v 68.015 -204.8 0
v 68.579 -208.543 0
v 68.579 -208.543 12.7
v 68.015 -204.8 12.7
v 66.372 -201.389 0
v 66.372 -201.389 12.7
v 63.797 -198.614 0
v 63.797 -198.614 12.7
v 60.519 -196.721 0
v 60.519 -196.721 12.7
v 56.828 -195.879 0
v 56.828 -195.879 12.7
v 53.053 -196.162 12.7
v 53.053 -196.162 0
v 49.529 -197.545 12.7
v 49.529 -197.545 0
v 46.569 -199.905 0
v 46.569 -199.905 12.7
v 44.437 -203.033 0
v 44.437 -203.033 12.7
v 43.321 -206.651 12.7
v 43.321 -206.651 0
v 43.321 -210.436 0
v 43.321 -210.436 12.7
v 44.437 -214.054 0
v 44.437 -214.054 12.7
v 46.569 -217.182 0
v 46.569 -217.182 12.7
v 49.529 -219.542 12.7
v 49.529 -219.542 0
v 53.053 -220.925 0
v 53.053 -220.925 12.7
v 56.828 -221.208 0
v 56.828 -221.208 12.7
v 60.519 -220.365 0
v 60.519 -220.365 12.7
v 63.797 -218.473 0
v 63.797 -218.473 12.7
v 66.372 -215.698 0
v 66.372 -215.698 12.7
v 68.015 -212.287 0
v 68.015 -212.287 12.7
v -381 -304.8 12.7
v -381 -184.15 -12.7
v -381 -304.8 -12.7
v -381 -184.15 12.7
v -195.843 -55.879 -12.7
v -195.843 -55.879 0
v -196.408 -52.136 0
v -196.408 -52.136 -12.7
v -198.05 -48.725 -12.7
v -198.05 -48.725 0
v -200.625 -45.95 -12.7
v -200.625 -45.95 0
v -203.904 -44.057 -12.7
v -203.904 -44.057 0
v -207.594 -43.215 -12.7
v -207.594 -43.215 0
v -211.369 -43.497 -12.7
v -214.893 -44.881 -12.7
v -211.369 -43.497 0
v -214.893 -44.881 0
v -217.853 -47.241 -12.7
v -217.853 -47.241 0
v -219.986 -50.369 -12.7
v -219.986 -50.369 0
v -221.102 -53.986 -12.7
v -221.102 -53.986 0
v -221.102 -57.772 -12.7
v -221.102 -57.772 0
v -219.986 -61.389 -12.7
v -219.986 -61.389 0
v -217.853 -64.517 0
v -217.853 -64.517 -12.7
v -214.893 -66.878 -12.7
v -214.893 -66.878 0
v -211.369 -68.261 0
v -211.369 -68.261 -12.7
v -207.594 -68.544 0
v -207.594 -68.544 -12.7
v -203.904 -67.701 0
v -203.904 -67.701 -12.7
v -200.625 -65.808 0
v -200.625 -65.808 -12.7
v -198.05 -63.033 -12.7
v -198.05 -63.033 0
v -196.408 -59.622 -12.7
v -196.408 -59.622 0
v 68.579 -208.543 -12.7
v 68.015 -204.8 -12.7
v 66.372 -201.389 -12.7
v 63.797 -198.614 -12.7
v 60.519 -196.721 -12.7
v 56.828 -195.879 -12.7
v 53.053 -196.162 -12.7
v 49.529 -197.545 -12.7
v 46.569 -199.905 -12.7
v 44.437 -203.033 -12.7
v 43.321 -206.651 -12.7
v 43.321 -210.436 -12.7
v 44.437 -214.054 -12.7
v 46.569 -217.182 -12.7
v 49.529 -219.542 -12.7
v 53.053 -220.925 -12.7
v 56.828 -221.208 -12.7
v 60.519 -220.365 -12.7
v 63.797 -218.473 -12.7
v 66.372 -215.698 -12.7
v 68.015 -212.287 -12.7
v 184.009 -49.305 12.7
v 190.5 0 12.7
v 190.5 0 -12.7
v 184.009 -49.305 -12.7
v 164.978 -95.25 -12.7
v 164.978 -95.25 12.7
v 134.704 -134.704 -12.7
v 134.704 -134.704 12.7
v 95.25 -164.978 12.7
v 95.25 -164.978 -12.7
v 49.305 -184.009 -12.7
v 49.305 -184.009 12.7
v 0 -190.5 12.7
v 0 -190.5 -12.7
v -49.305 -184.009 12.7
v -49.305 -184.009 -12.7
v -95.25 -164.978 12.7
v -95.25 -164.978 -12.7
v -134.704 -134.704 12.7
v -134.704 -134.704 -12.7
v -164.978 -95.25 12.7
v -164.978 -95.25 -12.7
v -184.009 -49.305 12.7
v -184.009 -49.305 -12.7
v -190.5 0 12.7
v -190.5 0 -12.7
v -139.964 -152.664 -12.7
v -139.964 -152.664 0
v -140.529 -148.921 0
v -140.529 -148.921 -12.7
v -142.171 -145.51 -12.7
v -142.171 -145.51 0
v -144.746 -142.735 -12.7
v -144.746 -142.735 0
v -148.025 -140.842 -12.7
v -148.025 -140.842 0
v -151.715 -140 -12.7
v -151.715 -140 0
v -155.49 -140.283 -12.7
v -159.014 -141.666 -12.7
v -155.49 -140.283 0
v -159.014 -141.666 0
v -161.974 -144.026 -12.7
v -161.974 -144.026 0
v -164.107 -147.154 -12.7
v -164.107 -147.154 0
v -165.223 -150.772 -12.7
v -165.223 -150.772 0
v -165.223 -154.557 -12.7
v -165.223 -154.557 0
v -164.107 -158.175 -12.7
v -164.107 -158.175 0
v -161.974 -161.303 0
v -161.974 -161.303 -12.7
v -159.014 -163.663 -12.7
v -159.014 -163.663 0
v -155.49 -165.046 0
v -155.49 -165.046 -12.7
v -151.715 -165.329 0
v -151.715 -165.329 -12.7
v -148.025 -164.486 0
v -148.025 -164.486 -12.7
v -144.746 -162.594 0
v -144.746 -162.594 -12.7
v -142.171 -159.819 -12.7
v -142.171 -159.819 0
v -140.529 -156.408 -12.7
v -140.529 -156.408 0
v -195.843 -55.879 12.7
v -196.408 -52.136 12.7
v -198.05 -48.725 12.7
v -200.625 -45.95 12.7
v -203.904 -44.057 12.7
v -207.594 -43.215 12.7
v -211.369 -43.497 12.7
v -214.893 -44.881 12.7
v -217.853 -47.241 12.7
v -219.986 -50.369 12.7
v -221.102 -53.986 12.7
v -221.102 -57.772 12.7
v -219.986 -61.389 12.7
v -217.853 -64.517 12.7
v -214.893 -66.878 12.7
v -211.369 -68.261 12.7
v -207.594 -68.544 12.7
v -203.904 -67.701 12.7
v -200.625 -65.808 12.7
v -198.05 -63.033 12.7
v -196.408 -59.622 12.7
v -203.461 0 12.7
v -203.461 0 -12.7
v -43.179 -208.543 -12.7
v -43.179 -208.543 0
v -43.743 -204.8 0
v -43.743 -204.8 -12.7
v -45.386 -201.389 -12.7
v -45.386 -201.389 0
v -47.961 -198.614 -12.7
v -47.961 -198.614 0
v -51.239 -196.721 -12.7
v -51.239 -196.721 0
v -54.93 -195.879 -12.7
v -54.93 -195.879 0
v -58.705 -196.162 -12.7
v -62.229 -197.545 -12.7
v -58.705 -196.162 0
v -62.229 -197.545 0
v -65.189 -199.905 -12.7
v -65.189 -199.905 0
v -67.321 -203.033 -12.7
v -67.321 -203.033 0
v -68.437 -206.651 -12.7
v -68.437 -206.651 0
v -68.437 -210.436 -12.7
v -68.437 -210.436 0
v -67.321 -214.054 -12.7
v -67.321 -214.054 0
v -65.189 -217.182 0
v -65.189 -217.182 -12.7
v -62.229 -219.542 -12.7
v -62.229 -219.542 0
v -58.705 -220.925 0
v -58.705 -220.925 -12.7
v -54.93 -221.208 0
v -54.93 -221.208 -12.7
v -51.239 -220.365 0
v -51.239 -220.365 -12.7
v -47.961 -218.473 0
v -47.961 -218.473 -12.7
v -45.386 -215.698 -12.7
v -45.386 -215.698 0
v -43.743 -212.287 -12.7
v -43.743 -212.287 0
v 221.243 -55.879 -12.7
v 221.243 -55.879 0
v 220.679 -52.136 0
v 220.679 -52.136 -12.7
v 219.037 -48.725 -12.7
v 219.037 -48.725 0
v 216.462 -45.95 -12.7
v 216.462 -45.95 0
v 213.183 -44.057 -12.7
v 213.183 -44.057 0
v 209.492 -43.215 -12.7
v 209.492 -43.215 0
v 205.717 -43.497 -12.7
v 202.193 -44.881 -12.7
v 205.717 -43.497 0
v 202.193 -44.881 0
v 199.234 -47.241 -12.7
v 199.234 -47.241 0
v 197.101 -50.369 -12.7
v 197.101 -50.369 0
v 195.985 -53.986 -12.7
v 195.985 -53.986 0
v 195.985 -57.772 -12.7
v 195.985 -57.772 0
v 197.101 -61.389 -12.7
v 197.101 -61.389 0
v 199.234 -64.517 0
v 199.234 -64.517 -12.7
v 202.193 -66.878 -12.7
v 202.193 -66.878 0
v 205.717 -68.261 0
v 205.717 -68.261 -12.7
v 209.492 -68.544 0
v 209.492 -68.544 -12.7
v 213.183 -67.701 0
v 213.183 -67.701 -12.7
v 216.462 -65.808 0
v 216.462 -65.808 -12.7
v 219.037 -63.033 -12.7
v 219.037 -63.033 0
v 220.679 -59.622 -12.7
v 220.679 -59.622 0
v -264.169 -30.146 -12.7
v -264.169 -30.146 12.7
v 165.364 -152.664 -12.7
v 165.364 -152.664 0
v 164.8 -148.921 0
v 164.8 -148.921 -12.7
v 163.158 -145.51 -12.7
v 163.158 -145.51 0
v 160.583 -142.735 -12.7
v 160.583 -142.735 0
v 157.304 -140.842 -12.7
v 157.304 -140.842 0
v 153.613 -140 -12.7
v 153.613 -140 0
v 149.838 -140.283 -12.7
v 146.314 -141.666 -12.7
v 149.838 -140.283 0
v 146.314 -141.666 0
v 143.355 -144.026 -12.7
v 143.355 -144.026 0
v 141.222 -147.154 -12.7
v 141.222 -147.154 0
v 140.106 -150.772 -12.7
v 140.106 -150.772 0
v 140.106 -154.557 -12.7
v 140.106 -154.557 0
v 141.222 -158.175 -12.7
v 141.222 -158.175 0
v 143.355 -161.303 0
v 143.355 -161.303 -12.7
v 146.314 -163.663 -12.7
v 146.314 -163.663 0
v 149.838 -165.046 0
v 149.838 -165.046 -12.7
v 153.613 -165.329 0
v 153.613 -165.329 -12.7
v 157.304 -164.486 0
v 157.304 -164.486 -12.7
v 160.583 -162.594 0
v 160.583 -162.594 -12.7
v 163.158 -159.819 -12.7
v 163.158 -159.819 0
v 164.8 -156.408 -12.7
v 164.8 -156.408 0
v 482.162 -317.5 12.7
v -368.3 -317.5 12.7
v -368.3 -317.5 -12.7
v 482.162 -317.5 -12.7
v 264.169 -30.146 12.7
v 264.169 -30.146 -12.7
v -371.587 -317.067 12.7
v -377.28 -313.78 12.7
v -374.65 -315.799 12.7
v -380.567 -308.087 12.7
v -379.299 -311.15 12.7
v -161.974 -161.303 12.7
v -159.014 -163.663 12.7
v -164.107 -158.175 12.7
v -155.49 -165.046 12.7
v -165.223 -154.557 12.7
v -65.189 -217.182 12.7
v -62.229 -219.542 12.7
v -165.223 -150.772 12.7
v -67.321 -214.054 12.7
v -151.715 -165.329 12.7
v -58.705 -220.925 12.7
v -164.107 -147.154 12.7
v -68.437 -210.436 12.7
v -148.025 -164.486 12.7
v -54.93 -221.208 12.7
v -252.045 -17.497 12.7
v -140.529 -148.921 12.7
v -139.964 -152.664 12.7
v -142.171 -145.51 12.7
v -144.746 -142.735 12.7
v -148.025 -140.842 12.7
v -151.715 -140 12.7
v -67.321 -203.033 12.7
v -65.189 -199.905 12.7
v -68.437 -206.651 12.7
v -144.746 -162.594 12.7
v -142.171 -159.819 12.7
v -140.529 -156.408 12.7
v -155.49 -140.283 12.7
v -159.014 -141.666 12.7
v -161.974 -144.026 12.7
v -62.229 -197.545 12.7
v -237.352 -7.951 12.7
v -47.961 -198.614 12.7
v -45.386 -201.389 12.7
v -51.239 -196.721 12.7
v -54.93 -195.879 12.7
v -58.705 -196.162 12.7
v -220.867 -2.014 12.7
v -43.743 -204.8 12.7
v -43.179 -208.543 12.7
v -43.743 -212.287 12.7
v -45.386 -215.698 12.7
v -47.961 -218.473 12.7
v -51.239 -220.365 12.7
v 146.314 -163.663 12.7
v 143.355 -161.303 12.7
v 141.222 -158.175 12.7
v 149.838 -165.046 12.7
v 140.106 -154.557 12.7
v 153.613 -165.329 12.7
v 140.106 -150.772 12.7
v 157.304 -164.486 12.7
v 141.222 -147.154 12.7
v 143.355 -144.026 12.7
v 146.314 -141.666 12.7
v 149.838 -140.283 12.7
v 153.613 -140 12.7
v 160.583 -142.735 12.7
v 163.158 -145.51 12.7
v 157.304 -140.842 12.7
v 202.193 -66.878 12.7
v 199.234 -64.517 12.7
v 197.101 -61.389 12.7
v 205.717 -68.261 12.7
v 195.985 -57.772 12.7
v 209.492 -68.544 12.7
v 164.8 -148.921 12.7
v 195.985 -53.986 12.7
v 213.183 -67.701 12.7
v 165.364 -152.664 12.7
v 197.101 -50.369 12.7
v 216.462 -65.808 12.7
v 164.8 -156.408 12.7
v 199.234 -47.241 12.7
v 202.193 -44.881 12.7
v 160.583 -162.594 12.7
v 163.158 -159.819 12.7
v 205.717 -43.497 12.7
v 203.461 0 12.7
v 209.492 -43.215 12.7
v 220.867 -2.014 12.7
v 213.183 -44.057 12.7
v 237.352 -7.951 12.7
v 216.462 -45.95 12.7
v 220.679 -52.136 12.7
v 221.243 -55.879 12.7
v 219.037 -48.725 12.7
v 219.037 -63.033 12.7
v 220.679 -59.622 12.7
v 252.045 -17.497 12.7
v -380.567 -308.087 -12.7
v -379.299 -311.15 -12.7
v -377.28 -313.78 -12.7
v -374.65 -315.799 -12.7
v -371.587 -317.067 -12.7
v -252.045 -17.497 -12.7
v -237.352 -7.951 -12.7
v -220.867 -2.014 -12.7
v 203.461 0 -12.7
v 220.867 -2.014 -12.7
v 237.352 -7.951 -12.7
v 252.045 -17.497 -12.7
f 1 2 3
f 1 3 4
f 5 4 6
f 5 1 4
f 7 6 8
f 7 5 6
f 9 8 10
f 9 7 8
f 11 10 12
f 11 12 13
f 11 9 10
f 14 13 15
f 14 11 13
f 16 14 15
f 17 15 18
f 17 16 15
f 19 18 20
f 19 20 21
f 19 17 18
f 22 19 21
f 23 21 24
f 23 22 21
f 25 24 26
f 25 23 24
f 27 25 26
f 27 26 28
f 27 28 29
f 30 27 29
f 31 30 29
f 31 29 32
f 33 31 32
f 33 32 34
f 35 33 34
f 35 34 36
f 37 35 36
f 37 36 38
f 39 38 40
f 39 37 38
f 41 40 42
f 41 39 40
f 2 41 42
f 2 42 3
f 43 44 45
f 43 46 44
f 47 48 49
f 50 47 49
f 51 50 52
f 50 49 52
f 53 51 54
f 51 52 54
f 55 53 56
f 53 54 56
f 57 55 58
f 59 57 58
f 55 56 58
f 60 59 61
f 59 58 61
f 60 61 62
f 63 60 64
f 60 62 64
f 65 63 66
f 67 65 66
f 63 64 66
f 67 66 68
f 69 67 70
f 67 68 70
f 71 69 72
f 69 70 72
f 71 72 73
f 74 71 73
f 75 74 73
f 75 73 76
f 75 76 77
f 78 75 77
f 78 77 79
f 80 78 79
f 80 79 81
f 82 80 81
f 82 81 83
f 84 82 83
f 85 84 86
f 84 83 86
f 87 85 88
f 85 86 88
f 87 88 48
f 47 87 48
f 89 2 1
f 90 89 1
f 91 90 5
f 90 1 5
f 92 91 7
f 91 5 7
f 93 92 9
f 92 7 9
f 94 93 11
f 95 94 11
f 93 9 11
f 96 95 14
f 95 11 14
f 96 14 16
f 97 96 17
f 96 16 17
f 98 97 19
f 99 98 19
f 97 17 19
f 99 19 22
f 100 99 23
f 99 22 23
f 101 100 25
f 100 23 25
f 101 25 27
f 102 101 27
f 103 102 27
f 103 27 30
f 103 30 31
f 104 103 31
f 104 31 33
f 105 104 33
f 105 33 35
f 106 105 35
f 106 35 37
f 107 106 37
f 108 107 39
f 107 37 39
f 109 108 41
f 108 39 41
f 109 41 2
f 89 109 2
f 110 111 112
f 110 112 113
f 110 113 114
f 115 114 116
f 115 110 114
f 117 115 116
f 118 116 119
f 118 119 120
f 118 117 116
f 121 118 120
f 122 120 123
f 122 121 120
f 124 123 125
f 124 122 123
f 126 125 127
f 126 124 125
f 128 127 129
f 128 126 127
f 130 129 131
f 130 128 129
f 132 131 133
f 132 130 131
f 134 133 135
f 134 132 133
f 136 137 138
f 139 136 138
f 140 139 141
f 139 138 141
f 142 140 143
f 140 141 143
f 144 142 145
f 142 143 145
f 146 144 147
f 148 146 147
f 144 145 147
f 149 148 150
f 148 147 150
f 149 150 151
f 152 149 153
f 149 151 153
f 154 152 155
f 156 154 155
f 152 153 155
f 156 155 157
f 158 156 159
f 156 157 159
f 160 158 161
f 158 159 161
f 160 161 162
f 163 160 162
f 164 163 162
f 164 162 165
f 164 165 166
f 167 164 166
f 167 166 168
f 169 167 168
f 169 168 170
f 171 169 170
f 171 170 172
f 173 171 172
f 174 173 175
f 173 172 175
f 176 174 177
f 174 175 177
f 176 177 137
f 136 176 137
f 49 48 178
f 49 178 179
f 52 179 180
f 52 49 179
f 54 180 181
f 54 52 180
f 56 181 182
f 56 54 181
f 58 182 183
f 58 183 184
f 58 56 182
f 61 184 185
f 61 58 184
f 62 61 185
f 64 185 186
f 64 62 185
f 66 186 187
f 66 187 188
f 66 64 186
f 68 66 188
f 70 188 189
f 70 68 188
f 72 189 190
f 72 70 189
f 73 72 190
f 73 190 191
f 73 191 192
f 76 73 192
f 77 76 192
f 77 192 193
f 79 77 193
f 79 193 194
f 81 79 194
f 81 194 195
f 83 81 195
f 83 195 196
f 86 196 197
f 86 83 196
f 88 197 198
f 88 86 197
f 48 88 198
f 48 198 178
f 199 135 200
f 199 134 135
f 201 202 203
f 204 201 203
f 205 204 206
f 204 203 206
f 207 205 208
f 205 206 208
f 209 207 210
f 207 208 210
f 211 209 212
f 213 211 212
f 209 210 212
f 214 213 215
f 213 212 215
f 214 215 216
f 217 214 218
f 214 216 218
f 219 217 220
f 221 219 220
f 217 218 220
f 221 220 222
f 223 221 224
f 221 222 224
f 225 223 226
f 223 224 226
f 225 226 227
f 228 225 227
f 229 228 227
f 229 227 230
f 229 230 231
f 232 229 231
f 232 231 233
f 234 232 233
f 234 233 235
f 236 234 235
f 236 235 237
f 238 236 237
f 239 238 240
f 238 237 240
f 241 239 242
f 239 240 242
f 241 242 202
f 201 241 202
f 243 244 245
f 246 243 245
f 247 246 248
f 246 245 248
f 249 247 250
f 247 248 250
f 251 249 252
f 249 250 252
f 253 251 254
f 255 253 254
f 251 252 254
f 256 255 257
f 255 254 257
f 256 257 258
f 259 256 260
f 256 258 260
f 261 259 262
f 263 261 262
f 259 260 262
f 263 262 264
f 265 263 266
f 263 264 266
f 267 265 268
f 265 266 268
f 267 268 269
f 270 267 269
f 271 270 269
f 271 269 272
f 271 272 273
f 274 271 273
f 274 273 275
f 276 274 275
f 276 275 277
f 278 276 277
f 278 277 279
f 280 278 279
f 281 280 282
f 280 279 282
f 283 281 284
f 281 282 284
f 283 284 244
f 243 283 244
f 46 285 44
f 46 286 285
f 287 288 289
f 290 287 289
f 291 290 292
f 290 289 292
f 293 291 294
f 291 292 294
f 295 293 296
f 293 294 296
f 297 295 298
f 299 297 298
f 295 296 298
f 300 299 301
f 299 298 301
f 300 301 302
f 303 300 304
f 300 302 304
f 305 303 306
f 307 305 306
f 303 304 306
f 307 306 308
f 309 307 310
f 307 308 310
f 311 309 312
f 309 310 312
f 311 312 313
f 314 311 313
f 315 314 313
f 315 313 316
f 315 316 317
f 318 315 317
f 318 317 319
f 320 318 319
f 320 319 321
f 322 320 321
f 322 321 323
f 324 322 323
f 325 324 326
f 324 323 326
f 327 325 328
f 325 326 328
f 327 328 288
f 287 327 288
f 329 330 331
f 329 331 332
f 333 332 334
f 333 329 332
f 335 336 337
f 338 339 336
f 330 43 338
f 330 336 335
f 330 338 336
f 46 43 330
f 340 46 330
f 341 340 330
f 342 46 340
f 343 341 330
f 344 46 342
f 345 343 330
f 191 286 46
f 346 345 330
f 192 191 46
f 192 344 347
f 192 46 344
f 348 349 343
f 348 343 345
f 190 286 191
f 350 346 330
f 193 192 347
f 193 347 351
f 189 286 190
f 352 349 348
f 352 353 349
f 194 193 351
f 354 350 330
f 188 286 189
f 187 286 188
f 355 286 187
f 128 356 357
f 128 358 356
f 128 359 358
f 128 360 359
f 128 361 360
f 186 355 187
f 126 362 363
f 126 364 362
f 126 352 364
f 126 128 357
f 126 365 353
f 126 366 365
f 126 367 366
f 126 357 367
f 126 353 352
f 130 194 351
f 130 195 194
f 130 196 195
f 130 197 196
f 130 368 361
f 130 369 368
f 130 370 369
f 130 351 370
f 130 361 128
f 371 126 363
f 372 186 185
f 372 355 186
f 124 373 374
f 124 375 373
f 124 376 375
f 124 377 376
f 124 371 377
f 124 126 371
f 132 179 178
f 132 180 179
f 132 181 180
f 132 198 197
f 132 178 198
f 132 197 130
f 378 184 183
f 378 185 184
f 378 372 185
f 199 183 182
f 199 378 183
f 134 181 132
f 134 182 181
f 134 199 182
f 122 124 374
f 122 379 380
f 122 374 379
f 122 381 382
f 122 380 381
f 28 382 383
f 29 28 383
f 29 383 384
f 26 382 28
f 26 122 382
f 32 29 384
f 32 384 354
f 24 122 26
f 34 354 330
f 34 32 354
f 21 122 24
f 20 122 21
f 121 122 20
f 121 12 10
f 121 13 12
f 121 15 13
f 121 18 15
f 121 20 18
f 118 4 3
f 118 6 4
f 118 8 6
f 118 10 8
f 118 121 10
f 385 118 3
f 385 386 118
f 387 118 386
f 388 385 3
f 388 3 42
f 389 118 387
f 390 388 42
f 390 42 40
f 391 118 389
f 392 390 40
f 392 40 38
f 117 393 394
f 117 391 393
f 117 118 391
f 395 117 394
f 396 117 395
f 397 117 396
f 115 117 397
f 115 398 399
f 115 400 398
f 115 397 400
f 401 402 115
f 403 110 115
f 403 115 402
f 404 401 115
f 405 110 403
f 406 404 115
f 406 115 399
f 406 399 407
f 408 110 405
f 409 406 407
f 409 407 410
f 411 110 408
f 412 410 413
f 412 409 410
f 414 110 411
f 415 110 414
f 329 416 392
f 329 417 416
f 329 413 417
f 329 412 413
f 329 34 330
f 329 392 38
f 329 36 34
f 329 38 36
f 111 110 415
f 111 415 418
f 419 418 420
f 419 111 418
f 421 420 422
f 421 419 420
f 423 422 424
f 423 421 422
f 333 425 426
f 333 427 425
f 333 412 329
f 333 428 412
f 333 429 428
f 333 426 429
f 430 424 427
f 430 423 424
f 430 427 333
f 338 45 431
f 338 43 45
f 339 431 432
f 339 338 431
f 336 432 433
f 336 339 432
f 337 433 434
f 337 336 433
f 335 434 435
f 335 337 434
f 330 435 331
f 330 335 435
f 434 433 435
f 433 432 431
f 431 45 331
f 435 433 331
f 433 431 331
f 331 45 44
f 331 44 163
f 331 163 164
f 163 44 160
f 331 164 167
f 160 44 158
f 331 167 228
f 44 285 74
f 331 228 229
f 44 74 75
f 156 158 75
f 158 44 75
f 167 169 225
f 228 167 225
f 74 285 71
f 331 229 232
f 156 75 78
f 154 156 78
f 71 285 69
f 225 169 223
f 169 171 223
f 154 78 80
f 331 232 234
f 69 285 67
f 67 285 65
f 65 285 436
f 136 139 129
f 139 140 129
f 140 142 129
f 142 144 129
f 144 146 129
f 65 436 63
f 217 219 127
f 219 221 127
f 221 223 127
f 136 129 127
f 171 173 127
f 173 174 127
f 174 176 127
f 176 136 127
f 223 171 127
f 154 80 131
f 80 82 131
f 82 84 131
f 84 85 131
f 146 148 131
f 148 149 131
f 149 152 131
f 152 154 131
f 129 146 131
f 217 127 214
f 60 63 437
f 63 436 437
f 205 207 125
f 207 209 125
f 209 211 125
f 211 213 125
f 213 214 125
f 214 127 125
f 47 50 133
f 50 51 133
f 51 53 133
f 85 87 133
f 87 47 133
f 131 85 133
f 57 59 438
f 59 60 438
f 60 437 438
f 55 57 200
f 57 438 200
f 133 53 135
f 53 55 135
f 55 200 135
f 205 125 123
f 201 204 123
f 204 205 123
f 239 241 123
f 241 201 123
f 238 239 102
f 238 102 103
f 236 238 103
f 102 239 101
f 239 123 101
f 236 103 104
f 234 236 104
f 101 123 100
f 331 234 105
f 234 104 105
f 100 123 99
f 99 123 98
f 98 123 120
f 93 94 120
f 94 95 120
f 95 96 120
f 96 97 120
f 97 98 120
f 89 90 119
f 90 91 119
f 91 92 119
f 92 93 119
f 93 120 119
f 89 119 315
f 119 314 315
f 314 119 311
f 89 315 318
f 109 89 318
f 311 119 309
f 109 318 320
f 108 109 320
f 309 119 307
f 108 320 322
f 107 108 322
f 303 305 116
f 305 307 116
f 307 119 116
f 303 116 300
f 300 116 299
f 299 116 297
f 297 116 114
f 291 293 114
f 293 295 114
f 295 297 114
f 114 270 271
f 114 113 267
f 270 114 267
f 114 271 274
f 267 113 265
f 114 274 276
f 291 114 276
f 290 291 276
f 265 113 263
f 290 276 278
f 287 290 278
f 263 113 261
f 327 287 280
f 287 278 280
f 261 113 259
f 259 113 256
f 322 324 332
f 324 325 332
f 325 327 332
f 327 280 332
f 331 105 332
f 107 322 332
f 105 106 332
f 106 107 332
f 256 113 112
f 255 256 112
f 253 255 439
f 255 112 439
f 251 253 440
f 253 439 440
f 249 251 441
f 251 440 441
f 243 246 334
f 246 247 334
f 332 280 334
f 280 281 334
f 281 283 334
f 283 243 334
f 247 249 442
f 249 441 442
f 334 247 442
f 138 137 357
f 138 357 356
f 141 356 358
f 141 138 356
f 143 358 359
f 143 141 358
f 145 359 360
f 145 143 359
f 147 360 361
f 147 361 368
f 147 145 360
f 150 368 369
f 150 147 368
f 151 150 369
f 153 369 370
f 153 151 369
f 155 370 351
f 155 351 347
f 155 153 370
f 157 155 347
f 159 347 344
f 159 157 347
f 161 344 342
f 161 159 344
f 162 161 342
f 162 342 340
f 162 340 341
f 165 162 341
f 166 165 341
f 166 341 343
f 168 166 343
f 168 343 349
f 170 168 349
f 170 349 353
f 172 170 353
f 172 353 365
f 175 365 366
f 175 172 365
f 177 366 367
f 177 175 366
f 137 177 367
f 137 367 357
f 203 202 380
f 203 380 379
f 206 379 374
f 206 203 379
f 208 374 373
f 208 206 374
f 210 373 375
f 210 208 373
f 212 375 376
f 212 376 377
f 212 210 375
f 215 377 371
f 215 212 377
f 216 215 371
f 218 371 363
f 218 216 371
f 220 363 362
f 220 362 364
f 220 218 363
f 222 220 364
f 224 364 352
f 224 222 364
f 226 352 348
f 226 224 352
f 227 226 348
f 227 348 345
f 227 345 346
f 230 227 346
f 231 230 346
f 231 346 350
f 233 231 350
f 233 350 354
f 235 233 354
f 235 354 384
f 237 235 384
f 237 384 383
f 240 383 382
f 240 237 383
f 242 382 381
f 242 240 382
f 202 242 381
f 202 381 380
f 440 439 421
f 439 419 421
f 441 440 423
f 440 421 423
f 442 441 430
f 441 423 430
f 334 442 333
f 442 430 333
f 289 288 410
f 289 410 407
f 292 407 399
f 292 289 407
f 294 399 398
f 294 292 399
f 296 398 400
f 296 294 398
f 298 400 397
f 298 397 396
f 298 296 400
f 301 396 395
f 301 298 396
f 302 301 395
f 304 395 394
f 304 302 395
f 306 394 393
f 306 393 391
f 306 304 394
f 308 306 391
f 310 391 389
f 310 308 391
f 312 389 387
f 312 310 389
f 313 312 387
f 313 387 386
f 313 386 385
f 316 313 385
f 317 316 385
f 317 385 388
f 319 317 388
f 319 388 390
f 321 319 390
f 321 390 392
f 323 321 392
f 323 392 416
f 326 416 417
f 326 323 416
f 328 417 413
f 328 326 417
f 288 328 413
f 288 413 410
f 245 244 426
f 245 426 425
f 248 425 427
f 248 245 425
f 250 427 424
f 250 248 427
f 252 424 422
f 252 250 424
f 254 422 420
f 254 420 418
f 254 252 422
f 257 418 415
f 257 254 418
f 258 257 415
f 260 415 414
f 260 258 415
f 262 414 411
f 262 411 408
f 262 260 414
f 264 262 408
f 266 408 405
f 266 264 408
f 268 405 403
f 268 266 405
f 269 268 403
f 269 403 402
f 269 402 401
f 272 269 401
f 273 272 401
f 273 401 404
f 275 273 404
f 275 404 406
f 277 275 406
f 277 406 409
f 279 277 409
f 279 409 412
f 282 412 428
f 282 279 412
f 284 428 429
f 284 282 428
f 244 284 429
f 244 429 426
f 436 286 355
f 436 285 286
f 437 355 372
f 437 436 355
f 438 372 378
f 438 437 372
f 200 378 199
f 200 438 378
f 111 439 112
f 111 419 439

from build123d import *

# Parameters (mm, degrees)
SKETCH1_R                = 12.7
BOSS_EXTRUDE1_DEPTH      = 12.7
BOSS_EXTRUDE1_DEPTH_BACK = 12.7
FILLET1_R                = 76.2


with BuildPart() as part:
    # Sketch1 → Boss-Extrude1 (new body, two sides)
    with BuildSketch(Plane.XY) as boss_extrude1_sk:
        with BuildLine():
            ThreePointArc((-381, -304.8), (-377.280256121, -313.780256121), (-368.3, -317.5))
            Line((-368.3, -317.5), (482.162068966, -317.5))
            Line((482.162068966, -317.5), (241.3, 0))
            Line((241.3, 0), (190.5, 0))
            ThreePointArc((190.5, 0), (0, -190.5), (-190.5, 0))
            Line((-190.5, 0), (-241.3, 0))
            Line((-241.3, 0), (-381, -184.15))
            Line((-381, -184.15), (-381, -304.8))
        make_face()
        with Locations((208.543385896, -55.879031838)):
            Circle(SKETCH1_R, mode=Mode.SUBTRACT)
        with Locations((-55.879031838, -208.543385896)):
            Circle(SKETCH1_R, mode=Mode.SUBTRACT)
        with Locations((-208.543385896, -55.879031838)):
            Circle(SKETCH1_R, mode=Mode.SUBTRACT)
        with Locations((-152.664354058, -152.664354058)):
            Circle(SKETCH1_R, mode=Mode.SUBTRACT)
        with Locations((55.879031838, -208.543385896)):
            Circle(SKETCH1_R, mode=Mode.SUBTRACT)
        with Locations((152.664354058, -152.664354058)):
            Circle(SKETCH1_R, mode=Mode.SUBTRACT)
    extrude(amount=BOSS_EXTRUDE1_DEPTH)
    extrude(boss_extrude1_sk.sketch, amount=-BOSS_EXTRUDE1_DEPTH_BACK)

    # Fillet1
    fillet1_edges = [part.edges().sort_by_distance(p)[0] for p in [
        (-241.3, 0, 0),
        (241.3, 0, 0),
    ]]
    fillet(fillet1_edges, radius=FILLET1_R)


solid = part.part
